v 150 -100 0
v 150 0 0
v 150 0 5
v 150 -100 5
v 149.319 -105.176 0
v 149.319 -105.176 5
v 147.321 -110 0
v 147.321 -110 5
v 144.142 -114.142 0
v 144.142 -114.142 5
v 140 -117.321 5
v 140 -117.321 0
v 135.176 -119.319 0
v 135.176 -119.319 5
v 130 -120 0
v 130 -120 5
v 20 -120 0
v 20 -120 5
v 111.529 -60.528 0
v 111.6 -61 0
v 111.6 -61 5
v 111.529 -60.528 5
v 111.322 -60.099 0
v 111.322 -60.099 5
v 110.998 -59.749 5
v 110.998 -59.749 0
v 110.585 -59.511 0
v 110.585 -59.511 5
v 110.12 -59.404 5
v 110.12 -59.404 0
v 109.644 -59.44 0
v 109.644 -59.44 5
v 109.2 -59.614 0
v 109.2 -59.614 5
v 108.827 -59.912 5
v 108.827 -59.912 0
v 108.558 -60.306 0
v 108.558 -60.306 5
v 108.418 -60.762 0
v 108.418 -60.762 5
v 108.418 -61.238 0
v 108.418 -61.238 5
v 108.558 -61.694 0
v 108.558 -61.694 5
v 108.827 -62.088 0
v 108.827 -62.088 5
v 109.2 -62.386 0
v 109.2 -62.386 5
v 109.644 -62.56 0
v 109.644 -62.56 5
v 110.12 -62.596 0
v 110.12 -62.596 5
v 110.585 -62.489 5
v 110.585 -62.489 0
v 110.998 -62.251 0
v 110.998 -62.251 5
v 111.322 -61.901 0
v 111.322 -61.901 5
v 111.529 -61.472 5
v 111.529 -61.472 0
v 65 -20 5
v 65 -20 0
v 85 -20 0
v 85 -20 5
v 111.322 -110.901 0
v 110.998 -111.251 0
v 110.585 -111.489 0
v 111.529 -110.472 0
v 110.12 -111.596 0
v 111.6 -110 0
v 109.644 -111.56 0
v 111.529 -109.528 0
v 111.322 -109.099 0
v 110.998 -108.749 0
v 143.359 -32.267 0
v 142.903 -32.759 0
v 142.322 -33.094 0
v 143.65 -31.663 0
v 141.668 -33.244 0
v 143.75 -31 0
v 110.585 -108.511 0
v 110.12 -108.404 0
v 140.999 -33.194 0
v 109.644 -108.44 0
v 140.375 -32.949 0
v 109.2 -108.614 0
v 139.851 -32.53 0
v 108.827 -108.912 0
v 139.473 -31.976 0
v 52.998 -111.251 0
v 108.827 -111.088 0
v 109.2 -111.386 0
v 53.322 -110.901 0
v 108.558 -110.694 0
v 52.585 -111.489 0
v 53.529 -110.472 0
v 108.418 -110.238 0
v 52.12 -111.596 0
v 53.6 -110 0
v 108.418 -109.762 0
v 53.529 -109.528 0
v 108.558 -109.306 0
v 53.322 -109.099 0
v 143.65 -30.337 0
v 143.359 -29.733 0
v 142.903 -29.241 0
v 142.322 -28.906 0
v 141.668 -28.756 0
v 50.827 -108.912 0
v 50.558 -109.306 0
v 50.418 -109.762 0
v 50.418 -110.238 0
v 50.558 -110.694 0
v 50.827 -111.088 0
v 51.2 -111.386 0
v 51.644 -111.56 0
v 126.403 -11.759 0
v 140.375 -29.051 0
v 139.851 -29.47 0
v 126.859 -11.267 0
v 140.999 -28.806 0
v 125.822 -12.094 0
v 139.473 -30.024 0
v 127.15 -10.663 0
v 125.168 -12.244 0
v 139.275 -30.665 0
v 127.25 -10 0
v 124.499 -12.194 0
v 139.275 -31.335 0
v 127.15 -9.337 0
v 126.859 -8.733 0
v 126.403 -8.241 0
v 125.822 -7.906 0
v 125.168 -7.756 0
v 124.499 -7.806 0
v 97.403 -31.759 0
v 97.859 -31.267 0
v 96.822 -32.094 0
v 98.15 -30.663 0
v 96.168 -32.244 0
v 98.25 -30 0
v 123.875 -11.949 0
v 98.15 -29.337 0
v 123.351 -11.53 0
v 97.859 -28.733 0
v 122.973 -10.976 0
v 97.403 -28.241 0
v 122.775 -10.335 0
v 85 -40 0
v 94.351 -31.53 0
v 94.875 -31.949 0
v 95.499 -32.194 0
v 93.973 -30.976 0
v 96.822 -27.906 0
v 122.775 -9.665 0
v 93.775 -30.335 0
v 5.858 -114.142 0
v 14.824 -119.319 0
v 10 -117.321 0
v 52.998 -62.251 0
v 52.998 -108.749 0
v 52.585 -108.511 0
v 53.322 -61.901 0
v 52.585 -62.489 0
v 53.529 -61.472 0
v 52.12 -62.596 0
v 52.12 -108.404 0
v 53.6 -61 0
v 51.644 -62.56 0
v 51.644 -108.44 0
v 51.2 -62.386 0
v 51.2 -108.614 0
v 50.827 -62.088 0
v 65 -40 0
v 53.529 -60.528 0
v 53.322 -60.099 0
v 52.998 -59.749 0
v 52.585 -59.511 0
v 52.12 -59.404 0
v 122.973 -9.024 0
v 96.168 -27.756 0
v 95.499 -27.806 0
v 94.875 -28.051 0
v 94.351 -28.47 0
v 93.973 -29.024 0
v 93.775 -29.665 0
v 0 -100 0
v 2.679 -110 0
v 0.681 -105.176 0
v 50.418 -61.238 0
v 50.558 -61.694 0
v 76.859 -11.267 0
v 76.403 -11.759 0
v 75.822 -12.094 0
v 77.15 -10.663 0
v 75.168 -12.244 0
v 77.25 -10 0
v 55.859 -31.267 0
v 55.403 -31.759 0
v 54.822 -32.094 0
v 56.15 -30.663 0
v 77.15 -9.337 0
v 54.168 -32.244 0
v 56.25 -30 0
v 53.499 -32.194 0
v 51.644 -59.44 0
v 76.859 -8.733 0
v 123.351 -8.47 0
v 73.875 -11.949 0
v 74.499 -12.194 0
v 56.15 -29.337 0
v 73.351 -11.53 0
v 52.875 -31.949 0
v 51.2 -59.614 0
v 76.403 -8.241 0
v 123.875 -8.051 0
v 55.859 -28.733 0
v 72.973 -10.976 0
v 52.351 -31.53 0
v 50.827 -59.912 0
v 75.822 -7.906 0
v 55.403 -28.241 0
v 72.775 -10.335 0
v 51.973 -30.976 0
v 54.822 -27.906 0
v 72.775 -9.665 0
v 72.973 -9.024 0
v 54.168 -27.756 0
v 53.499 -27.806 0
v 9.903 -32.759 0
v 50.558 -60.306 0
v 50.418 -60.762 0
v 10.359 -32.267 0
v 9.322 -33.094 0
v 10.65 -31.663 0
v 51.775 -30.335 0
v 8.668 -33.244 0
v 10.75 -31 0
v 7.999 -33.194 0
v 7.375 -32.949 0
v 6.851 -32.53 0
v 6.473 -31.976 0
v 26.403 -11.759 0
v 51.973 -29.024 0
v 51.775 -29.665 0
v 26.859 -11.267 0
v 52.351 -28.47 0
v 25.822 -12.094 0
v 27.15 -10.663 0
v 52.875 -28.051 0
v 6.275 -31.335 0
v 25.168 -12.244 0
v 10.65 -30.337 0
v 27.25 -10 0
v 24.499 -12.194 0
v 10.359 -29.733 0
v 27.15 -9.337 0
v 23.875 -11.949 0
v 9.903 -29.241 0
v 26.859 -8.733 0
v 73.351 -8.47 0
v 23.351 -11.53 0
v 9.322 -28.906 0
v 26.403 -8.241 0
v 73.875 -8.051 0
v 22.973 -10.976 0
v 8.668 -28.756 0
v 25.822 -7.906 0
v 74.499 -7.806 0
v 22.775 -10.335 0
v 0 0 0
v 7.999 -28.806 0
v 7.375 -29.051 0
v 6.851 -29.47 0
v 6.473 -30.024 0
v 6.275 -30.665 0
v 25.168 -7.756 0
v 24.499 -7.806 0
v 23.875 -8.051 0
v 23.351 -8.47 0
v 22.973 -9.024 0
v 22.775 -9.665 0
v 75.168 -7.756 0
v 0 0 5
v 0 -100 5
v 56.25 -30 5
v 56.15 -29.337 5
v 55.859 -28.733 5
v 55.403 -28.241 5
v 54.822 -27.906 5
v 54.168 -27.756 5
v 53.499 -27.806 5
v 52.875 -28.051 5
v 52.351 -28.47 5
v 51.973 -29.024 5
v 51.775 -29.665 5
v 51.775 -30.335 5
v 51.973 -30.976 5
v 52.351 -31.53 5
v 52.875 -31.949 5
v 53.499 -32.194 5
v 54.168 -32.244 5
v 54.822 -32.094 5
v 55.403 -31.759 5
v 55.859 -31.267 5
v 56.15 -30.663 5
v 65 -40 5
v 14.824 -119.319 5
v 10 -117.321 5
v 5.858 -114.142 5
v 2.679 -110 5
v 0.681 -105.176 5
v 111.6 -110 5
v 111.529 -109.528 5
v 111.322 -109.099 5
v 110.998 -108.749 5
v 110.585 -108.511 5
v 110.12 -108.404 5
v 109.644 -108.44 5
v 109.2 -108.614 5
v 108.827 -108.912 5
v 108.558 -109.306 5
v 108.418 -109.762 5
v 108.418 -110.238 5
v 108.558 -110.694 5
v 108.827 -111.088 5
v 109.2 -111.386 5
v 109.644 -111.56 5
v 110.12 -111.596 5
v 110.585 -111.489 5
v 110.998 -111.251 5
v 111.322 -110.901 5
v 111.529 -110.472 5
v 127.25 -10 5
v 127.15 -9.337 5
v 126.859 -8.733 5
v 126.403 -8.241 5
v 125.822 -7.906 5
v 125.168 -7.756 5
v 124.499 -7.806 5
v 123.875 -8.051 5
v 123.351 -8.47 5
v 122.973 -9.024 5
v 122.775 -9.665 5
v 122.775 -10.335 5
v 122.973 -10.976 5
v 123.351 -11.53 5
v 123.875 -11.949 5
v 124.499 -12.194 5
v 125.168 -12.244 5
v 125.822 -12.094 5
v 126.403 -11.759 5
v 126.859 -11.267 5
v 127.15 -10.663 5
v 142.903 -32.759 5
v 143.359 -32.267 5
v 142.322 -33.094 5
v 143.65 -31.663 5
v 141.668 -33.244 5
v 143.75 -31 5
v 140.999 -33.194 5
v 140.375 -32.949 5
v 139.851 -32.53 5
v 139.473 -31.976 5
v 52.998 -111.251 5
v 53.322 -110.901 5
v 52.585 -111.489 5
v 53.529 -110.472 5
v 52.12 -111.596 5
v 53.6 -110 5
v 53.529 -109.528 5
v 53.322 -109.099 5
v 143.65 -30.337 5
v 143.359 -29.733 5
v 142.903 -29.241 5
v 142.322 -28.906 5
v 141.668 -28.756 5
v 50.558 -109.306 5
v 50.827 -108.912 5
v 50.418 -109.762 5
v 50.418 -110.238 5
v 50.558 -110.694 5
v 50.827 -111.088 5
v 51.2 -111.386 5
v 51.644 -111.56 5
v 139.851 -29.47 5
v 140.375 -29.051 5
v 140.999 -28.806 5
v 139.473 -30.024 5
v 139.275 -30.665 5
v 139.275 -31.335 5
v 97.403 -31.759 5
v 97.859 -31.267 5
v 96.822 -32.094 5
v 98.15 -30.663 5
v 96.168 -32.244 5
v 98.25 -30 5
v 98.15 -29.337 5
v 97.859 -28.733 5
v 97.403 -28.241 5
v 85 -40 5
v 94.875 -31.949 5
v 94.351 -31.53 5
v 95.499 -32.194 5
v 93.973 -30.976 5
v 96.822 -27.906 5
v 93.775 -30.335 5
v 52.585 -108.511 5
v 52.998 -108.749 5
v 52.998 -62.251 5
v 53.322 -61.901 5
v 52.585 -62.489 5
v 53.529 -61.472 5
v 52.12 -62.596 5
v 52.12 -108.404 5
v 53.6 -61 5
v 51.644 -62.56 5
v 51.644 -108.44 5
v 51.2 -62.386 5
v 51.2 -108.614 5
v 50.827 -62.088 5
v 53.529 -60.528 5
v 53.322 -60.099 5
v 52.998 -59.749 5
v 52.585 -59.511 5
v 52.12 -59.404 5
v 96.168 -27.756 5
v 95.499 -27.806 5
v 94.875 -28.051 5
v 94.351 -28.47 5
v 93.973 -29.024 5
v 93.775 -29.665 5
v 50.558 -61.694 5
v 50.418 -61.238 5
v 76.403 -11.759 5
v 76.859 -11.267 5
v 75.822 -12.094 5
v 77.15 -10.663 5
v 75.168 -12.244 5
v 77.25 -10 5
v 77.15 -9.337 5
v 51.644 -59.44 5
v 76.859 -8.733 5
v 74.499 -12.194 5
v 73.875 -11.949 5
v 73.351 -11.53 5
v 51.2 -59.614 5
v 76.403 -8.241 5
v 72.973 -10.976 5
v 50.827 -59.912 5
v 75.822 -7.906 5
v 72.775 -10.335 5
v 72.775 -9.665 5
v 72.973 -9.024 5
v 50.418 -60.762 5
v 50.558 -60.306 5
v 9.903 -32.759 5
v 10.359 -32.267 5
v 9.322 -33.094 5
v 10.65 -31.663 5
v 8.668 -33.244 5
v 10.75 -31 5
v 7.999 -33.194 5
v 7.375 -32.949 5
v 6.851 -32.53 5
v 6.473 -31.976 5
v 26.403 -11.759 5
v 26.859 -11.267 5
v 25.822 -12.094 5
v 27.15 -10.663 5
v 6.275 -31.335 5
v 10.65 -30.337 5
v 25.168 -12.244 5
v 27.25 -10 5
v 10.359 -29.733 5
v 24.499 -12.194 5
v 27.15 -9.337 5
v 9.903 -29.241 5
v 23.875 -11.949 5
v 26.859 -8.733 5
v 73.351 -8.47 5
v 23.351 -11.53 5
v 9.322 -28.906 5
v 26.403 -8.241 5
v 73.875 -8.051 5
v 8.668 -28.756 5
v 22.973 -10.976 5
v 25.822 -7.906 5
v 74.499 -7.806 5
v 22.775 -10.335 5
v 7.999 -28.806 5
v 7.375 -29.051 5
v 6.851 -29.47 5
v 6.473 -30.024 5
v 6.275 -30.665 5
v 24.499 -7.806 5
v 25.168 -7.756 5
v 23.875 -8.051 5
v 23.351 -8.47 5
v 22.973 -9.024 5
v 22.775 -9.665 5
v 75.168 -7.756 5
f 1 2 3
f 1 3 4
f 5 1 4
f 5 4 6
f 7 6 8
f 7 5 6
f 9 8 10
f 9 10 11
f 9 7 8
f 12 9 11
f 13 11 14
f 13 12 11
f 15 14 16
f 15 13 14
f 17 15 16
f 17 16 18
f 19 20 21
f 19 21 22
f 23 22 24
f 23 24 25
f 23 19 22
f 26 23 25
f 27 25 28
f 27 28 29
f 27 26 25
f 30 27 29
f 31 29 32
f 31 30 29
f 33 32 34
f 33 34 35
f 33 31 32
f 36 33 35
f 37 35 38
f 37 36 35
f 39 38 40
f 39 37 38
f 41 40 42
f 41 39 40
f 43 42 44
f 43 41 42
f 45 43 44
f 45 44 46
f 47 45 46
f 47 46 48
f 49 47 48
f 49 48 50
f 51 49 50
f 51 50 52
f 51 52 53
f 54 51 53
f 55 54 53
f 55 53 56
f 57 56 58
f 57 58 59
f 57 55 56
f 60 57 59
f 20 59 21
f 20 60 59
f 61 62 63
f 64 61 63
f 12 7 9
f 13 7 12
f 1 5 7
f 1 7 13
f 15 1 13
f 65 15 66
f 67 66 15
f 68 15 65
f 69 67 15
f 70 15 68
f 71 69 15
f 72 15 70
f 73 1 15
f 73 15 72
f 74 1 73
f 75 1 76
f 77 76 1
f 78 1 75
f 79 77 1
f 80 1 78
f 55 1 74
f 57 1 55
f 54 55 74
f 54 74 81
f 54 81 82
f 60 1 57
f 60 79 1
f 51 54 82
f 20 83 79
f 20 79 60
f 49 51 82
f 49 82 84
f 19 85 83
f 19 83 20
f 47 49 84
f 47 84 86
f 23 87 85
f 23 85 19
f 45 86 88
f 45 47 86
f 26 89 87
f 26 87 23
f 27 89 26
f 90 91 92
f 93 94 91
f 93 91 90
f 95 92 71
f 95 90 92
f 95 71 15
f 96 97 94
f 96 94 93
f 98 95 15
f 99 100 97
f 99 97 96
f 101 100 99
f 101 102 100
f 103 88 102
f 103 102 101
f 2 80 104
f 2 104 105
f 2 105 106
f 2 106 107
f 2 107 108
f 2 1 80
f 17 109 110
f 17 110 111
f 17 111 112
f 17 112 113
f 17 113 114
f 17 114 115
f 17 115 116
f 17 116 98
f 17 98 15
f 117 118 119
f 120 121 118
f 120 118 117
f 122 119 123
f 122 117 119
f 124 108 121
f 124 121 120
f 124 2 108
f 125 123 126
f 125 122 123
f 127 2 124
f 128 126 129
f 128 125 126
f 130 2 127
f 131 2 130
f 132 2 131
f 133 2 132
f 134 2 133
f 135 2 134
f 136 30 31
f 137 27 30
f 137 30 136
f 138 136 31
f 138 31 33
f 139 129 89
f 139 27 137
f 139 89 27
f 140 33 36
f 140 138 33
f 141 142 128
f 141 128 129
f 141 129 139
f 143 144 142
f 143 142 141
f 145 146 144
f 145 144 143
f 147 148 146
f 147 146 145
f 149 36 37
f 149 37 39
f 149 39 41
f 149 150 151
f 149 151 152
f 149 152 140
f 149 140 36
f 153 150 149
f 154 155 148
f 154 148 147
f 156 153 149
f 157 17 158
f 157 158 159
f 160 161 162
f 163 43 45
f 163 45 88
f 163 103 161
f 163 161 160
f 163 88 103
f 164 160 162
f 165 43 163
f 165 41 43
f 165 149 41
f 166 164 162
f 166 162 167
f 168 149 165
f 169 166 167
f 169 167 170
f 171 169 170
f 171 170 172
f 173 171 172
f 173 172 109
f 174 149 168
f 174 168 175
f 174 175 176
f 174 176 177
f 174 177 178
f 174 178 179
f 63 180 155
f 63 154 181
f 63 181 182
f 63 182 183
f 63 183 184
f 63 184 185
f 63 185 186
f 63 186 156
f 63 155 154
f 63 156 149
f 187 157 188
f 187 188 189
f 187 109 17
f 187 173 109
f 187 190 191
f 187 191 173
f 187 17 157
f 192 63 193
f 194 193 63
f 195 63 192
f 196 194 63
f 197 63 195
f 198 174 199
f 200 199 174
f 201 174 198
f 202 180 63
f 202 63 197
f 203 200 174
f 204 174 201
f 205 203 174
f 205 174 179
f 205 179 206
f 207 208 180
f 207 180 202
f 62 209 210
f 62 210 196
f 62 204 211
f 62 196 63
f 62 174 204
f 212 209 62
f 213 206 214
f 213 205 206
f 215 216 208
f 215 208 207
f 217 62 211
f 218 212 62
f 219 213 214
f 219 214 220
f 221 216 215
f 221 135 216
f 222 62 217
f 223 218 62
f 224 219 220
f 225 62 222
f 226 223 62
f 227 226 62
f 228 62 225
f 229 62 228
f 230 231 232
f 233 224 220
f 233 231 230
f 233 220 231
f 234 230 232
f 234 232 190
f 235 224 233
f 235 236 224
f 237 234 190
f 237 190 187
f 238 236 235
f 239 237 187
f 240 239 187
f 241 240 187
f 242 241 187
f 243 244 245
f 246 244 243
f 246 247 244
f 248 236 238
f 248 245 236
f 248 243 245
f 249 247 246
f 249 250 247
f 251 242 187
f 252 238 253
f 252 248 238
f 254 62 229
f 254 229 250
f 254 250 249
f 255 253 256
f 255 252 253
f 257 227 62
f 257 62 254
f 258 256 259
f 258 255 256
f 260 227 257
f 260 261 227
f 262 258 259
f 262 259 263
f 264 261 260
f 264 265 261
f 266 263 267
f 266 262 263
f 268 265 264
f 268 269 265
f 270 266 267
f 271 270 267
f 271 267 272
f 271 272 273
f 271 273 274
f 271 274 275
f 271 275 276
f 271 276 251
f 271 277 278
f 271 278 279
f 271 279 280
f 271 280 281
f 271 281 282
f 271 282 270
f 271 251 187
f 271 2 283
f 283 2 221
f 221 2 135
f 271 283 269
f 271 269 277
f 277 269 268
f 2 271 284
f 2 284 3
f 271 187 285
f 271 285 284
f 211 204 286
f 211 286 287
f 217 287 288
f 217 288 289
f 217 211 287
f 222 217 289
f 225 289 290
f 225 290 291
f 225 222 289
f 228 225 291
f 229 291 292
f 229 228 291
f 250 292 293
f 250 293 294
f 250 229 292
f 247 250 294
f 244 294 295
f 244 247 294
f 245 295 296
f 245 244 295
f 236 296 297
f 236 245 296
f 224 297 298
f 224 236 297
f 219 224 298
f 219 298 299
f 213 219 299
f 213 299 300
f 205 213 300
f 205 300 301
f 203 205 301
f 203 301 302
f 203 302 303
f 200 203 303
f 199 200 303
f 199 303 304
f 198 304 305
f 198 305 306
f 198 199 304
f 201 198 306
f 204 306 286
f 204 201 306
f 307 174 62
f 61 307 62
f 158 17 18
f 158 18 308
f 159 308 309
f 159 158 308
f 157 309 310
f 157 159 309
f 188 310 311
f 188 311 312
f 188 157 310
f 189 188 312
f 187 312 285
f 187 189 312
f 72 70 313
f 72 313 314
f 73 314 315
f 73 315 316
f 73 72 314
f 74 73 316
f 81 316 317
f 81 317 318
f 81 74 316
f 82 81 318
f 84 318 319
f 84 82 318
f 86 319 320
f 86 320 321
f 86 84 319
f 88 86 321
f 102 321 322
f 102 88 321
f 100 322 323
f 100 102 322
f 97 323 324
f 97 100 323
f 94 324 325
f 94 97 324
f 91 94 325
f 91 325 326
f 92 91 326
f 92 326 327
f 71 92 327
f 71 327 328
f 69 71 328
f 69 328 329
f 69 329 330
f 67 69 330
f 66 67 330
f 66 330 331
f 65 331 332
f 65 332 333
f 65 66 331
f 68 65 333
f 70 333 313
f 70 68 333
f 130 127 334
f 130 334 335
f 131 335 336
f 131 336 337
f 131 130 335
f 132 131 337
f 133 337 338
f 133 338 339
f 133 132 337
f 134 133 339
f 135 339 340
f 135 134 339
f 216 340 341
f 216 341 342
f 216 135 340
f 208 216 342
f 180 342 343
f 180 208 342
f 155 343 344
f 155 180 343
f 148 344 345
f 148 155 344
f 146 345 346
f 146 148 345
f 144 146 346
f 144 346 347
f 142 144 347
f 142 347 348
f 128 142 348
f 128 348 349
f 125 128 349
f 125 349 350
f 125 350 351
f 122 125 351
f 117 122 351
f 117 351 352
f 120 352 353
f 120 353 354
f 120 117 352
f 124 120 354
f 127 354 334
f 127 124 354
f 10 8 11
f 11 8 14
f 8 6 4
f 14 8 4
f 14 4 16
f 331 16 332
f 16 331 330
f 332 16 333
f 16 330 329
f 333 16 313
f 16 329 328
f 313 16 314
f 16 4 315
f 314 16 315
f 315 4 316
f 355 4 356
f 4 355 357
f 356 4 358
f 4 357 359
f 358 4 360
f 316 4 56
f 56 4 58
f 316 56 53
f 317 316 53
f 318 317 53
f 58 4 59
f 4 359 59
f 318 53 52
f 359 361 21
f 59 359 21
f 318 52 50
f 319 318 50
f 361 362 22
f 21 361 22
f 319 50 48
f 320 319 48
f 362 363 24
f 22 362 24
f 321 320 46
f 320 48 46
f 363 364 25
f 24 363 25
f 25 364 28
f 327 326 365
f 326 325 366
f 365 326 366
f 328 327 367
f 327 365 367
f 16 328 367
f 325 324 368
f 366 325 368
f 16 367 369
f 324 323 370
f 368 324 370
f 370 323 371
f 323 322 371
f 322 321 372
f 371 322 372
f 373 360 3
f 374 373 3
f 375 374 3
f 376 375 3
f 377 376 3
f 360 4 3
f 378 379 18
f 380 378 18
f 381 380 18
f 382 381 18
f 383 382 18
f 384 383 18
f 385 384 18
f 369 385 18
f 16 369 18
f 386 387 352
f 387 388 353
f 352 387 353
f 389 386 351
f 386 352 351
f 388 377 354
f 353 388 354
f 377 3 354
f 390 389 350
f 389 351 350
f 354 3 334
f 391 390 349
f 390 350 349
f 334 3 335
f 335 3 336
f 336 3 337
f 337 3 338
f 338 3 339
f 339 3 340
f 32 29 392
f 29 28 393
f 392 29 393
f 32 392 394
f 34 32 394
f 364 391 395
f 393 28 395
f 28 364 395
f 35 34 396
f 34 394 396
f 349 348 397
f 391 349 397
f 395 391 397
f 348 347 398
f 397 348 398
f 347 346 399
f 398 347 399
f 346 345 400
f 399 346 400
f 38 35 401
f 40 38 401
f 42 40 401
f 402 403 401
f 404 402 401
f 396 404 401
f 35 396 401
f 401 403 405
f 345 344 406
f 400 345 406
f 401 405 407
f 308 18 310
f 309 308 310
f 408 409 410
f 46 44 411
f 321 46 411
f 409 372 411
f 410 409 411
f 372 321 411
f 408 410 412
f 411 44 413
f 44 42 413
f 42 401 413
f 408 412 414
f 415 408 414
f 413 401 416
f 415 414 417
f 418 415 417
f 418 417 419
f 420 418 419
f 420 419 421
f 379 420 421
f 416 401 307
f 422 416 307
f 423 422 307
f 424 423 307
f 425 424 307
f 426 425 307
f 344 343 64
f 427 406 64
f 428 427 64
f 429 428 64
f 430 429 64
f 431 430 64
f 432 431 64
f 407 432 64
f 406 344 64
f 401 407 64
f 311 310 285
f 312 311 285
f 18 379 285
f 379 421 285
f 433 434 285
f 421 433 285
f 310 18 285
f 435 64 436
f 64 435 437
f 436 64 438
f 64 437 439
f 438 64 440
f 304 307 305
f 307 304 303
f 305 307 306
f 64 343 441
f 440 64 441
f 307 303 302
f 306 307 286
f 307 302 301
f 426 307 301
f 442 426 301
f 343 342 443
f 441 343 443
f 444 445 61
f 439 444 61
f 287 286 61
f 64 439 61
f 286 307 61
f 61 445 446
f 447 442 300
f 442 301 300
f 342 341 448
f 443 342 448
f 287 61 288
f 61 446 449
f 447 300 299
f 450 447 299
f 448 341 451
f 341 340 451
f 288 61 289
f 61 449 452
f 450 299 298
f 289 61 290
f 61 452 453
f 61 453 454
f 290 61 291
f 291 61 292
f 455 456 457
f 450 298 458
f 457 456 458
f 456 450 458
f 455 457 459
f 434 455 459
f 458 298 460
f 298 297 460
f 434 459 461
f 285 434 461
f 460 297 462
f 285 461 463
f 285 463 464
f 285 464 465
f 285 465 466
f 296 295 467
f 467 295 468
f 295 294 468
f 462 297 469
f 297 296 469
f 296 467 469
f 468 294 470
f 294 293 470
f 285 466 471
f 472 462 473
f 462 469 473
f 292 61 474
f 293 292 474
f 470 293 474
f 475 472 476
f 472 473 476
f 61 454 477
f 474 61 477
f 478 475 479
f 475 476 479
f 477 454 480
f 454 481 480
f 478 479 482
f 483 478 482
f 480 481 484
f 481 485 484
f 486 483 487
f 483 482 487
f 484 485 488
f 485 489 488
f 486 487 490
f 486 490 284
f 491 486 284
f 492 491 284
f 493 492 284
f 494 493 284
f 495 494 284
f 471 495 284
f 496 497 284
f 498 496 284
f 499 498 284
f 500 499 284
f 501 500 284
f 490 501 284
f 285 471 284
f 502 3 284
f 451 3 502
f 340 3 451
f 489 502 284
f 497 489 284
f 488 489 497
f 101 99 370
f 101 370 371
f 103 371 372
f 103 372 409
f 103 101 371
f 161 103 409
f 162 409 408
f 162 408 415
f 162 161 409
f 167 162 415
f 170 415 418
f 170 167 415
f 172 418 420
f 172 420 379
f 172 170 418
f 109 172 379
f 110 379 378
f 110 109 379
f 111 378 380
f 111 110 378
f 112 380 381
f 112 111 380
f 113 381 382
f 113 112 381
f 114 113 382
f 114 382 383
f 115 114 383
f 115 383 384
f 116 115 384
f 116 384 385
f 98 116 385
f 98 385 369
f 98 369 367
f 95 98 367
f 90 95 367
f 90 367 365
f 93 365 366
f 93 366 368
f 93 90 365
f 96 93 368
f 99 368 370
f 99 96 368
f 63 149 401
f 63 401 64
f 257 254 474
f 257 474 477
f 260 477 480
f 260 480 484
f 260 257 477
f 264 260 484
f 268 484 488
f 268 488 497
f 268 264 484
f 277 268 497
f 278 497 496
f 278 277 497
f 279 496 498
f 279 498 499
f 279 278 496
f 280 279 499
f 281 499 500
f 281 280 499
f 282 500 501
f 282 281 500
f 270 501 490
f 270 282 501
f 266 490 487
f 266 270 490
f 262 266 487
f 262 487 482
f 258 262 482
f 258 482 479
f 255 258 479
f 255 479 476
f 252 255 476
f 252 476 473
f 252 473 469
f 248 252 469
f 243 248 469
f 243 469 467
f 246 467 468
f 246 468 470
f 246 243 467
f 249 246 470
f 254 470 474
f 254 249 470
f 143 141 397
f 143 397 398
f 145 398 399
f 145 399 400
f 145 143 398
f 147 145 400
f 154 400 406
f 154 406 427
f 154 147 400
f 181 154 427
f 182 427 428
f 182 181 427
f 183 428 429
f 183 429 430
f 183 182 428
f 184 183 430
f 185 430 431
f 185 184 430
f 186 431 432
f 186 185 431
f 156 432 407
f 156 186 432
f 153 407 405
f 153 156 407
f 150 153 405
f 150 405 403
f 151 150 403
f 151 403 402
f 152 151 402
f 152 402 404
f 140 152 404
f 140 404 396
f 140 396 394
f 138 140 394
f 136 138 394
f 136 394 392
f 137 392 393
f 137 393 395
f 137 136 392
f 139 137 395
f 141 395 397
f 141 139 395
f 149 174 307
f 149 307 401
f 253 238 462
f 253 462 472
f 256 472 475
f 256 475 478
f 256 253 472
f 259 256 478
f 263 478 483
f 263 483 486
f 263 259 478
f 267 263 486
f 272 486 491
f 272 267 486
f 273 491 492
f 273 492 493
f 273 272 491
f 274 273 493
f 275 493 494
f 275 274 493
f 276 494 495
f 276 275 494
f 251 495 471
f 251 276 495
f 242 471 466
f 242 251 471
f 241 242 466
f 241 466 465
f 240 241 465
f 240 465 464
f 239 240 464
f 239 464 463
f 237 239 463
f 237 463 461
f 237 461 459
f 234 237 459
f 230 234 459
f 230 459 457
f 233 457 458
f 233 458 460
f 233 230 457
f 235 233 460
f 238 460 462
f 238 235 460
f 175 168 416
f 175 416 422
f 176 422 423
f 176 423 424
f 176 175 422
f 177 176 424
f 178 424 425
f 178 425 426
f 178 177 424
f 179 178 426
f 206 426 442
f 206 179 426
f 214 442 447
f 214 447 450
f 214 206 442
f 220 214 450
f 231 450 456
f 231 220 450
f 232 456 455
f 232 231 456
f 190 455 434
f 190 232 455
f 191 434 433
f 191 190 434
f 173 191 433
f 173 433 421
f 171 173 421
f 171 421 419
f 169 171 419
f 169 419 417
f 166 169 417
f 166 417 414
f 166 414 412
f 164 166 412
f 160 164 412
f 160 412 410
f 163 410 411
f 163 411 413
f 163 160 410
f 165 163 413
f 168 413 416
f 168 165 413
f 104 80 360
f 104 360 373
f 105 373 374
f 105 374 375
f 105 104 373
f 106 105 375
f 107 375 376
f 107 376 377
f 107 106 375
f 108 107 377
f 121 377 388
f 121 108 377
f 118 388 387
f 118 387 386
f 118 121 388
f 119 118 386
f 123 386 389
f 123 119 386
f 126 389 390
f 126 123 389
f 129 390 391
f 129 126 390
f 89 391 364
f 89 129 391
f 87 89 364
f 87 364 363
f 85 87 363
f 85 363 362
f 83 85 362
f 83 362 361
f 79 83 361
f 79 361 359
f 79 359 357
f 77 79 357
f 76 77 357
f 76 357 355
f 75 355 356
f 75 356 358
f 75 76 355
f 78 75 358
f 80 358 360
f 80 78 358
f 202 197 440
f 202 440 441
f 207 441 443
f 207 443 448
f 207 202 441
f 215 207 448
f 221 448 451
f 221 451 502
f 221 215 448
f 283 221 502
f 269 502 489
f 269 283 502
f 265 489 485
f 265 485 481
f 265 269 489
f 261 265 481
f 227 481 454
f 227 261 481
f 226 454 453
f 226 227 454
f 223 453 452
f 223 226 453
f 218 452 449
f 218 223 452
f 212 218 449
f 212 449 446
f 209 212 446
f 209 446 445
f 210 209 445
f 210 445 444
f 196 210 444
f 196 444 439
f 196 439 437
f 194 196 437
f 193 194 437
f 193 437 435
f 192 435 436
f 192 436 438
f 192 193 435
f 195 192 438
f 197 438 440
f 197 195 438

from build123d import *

# Parameters (mm, degrees)
ESQUISSE1_R        = 1.6
ESQUISSE1_R_2      = 2.25
ESQUISSE1_W        = 20
ESQUISSE1_H        = 20
BOSS_EXTRU_1_DEPTH = 5


with BuildPart() as part:
    # Esquisse1 → Boss.-Extru.1 (new body)
    with BuildSketch(Plane.XY):
        with BuildLine():
            Line((0, 0), (150, 0))
            Line((150, 0), (150, -100))
            ThreePointArc((150, -100), (144.142135624, -114.142135624), (130, -120))
            Line((130, -120), (20, -120))
            ThreePointArc((20, -120), (5.857864376, -114.142135624), (0, -100))
            Line((0, -100), (0, 0))
        make_face()
        with Locations((52, -61)):
            Circle(ESQUISSE1_R, mode=Mode.SUBTRACT)
        with Locations((110, -61)):
            Circle(ESQUISSE1_R, mode=Mode.SUBTRACT)
        with Locations((110, -110)):
            Circle(ESQUISSE1_R, mode=Mode.SUBTRACT)
        with Locations((52, -110)):
            Circle(ESQUISSE1_R, mode=Mode.SUBTRACT)
        with Locations((8.5, -31)):
            Circle(ESQUISSE1_R_2, mode=Mode.SUBTRACT)
        with Locations((141.5, -31)):
            Circle(ESQUISSE1_R_2, mode=Mode.SUBTRACT)
        with Locations((25, -10)):
            Circle(ESQUISSE1_R_2, mode=Mode.SUBTRACT)
        with Locations((125, -10)):
            Circle(ESQUISSE1_R_2, mode=Mode.SUBTRACT)
        with Locations((96, -30)):
            Circle(ESQUISSE1_R_2, mode=Mode.SUBTRACT)
        with Locations((54, -30)):
            Circle(ESQUISSE1_R_2, mode=Mode.SUBTRACT)
        with Locations((75, -10)):
            Circle(ESQUISSE1_R_2, mode=Mode.SUBTRACT)
        with Locations((75, -30)):
            Rectangle(ESQUISSE1_W, ESQUISSE1_H, mode=Mode.SUBTRACT)
    extrude(amount=BOSS_EXTRU_1_DEPTH)


solid = part.part
